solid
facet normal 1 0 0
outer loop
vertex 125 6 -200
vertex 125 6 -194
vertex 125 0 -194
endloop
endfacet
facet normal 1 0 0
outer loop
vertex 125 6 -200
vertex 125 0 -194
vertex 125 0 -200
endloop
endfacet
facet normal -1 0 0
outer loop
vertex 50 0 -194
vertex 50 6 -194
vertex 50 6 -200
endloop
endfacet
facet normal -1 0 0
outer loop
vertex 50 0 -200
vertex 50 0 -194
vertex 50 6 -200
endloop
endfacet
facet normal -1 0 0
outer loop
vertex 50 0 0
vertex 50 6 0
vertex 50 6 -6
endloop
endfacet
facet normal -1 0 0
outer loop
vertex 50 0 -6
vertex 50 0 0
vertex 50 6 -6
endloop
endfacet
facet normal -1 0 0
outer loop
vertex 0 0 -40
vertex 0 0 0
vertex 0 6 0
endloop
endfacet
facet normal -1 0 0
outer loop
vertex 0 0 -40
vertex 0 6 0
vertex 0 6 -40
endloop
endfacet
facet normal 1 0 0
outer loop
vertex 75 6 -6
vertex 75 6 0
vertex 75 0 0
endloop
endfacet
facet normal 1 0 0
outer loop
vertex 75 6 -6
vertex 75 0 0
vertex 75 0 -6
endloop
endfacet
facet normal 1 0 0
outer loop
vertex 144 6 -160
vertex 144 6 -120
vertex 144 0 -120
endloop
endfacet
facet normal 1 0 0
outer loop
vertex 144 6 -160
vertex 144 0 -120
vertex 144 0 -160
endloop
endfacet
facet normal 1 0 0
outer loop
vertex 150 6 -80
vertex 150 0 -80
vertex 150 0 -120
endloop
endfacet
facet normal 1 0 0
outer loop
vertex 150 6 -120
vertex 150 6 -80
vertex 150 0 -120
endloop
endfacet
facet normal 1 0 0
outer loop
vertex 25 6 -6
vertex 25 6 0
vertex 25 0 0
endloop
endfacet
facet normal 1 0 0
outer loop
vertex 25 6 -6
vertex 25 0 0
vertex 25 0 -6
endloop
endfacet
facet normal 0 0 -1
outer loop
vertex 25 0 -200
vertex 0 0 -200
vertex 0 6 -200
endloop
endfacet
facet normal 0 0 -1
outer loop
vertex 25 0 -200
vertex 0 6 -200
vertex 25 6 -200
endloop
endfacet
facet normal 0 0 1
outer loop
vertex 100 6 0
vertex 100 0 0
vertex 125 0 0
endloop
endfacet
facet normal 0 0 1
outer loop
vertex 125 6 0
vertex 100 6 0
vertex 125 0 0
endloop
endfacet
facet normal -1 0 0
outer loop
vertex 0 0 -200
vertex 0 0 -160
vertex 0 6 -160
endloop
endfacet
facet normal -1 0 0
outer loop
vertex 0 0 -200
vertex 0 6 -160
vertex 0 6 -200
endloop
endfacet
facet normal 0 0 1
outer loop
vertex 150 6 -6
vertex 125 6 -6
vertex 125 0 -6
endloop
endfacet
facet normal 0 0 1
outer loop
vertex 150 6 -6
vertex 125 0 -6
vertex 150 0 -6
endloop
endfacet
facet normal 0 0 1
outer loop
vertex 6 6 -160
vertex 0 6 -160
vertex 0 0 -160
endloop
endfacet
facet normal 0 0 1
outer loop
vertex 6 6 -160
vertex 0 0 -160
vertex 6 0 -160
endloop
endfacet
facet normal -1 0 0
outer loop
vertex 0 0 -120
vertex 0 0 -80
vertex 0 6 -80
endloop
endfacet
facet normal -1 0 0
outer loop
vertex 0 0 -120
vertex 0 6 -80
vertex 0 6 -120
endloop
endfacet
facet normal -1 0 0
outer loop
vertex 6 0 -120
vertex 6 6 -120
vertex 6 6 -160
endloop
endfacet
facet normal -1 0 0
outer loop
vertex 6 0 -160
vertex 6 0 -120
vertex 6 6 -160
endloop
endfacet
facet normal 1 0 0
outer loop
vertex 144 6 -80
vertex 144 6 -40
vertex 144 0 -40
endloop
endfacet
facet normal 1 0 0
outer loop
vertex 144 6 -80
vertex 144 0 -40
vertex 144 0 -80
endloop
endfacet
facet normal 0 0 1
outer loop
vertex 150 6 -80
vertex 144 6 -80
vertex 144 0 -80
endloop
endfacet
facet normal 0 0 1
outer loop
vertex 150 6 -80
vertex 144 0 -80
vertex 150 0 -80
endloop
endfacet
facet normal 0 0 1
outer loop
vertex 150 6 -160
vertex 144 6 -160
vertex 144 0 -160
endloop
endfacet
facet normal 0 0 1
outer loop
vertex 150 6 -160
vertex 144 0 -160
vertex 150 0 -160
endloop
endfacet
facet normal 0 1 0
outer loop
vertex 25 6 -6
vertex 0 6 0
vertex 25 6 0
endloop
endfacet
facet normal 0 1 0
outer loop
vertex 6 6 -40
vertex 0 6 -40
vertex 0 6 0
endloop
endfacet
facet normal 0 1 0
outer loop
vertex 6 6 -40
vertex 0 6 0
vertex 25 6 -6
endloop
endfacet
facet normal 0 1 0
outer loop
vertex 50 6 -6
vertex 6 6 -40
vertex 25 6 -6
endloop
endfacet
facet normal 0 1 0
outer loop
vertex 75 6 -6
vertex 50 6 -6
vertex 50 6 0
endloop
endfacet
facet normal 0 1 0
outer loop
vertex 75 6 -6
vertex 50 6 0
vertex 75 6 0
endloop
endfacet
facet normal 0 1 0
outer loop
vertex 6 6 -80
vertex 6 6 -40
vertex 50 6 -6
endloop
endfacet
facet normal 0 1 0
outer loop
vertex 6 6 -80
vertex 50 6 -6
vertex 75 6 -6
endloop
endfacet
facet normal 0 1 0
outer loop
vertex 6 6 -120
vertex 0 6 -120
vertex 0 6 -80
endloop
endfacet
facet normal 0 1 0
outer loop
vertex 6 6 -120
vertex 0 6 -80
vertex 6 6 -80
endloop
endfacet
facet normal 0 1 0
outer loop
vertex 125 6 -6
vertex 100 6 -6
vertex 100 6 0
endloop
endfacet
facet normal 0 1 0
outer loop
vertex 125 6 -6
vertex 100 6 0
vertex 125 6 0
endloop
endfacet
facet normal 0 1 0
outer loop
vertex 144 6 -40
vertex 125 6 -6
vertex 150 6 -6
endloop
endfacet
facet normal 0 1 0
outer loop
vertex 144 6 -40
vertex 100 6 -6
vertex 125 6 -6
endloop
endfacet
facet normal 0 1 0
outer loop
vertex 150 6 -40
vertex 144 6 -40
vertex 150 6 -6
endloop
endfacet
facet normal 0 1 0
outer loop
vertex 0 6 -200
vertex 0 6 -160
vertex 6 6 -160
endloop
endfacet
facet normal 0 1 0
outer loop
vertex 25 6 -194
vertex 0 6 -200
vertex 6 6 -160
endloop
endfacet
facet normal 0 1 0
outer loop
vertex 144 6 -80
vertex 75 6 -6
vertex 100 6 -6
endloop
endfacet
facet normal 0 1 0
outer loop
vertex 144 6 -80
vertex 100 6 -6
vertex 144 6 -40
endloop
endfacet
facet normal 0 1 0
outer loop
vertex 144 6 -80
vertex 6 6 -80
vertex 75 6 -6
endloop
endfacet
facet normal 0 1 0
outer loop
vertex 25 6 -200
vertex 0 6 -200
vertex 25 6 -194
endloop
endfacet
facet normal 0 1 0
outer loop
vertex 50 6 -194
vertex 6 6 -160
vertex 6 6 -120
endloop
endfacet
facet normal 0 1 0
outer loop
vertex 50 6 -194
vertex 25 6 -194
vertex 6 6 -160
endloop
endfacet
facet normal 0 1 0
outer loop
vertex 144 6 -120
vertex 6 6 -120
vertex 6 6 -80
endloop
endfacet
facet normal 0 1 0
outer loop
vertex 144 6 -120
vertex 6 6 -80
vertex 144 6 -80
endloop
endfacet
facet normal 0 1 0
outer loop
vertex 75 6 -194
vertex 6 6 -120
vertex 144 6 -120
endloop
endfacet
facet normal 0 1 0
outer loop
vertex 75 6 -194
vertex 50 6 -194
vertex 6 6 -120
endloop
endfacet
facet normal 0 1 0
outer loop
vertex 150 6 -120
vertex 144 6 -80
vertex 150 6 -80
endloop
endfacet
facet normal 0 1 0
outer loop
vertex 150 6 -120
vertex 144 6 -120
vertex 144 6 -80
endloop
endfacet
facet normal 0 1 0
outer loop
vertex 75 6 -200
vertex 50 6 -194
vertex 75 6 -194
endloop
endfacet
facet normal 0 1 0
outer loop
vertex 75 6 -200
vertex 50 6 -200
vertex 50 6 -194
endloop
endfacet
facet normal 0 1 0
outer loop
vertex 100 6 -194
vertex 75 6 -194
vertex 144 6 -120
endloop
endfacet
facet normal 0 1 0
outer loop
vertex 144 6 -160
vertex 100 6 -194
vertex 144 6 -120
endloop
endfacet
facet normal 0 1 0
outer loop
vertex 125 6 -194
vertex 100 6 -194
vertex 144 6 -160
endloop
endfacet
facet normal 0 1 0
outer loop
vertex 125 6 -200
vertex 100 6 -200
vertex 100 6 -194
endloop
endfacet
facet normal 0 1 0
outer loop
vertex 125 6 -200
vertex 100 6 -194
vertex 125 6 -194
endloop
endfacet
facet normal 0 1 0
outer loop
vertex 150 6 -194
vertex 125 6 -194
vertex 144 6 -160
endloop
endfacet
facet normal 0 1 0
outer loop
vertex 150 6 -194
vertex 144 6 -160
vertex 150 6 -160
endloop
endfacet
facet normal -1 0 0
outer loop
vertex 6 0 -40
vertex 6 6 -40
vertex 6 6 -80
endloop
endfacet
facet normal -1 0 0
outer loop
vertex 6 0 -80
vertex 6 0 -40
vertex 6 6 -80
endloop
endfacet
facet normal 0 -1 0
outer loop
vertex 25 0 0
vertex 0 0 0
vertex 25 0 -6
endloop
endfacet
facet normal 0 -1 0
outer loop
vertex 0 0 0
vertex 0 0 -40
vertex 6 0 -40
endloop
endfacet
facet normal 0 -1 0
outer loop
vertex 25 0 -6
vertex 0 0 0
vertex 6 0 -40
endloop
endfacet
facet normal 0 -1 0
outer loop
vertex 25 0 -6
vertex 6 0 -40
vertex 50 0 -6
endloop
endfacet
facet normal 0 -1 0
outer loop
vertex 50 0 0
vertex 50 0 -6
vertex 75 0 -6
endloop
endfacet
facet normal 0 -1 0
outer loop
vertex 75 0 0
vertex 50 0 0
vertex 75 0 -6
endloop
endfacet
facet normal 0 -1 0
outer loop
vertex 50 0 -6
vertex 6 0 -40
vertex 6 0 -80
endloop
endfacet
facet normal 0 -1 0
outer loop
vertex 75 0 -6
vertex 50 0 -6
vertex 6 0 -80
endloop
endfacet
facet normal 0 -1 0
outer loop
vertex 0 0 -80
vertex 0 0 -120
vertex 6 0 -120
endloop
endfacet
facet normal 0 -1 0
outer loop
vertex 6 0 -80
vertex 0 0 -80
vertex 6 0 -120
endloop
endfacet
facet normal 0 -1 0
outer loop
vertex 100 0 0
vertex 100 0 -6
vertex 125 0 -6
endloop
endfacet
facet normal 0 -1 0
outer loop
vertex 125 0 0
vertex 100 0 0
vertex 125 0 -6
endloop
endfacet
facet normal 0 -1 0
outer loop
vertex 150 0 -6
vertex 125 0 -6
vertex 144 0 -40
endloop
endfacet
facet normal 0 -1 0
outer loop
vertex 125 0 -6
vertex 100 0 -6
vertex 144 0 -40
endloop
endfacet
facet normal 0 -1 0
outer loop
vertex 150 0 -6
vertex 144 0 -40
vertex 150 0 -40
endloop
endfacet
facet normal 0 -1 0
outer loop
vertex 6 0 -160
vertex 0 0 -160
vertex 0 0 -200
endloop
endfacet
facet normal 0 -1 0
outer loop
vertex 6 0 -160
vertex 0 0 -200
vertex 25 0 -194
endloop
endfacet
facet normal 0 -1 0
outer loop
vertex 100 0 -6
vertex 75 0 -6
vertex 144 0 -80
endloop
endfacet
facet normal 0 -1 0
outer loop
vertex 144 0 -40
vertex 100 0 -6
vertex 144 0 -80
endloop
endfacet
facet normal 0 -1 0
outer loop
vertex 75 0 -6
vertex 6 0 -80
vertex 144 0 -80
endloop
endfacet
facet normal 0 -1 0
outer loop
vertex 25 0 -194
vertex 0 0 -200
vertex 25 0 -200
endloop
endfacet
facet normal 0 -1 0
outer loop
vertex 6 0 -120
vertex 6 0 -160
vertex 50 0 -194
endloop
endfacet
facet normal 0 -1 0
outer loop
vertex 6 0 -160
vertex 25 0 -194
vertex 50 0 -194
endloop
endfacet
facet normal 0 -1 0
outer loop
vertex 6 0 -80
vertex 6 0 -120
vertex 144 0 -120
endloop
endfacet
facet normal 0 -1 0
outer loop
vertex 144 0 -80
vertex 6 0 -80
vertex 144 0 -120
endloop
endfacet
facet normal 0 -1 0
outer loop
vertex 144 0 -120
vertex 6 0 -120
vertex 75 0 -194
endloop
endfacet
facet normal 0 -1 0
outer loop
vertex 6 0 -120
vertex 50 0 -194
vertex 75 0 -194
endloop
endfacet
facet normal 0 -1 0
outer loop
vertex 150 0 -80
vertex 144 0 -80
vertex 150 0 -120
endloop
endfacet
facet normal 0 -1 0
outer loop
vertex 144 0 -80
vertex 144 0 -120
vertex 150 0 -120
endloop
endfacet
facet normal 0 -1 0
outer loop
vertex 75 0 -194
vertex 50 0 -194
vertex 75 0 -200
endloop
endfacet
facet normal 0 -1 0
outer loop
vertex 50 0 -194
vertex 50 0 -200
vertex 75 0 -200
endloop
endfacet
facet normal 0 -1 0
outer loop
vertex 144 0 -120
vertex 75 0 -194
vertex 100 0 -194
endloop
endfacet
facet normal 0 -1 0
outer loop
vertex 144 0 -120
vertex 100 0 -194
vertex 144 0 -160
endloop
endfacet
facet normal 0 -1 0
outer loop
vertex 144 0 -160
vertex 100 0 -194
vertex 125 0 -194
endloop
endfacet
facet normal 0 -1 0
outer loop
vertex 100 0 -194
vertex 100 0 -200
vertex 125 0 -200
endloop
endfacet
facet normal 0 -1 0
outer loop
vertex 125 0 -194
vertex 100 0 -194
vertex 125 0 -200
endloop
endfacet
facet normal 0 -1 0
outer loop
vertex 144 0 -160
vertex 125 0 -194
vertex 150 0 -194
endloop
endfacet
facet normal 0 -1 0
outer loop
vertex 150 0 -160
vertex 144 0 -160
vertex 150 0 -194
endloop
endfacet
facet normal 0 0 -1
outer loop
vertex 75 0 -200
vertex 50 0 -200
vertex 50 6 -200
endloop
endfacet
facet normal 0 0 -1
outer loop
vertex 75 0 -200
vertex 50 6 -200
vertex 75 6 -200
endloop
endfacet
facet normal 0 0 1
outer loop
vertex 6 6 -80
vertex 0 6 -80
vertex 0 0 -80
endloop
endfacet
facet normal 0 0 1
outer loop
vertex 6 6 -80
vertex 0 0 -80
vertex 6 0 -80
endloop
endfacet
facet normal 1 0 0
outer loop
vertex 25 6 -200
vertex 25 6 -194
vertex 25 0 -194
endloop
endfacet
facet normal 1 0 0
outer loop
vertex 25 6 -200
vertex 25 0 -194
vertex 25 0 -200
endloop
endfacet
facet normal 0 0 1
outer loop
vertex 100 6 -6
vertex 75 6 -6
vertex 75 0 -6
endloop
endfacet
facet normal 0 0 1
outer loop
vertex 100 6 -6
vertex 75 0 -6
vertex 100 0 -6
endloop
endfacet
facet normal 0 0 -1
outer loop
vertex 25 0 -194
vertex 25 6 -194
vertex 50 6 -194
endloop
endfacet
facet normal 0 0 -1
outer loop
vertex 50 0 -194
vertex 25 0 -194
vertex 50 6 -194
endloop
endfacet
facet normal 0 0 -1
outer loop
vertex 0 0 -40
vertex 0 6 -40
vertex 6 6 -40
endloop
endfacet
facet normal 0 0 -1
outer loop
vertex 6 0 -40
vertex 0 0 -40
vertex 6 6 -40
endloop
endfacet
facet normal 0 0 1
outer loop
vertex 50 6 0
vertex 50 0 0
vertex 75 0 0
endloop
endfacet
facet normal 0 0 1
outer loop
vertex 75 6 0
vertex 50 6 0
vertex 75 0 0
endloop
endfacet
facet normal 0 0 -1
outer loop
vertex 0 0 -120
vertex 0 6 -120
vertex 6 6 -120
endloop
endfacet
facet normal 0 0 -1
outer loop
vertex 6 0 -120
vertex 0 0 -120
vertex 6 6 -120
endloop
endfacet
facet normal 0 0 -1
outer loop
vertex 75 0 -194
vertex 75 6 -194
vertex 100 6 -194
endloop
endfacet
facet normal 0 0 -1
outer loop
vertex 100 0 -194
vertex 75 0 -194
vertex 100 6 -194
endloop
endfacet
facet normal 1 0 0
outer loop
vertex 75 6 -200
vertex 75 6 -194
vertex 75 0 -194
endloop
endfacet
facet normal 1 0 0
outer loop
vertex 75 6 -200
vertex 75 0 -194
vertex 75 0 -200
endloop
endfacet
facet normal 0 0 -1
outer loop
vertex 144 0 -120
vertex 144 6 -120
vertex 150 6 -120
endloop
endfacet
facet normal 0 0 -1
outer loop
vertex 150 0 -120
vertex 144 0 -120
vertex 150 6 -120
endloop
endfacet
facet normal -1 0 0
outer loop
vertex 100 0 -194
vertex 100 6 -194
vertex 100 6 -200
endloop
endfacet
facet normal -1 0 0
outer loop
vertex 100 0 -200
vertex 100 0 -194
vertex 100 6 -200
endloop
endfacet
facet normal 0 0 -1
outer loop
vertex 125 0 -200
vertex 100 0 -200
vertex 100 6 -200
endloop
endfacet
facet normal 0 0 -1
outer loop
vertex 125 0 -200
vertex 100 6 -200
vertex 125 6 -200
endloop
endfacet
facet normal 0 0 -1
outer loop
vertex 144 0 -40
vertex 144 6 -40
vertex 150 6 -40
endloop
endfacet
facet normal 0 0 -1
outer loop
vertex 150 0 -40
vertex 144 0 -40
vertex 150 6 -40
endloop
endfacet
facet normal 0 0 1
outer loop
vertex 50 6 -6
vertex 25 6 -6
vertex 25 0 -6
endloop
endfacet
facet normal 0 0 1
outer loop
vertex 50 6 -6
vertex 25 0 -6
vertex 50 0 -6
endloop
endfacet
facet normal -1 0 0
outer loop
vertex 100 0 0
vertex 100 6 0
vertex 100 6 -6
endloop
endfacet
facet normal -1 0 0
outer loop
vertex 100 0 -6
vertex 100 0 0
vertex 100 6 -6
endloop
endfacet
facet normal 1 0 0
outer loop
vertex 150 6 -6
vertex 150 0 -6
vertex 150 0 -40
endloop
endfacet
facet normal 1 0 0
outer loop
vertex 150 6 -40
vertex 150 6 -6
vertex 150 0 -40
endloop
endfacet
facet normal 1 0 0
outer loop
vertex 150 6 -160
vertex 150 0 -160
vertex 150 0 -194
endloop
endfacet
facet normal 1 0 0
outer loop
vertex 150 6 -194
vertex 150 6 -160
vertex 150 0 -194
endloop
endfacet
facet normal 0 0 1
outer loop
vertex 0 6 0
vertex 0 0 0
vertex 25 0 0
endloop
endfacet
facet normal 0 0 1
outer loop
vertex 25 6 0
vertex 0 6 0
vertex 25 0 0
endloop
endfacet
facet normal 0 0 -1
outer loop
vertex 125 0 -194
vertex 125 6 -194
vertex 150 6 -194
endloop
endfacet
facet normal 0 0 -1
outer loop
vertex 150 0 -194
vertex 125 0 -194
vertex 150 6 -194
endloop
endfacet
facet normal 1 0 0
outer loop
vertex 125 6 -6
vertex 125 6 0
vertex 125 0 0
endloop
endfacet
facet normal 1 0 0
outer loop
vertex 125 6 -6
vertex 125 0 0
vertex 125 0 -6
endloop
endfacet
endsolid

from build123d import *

# Parameters (mm, degrees)
SKETCH1_W           = 150
SKETCH1_H           = 200
BOSS_EXTRUDE1_DEPTH = 6
SKETCH2_W           = 25
SKETCH2_H           = 6
SKETCH2_W_2         = 6
SKETCH2_H_2         = 40
CUT_EXTRUDE1_DEPTH  = 6


with BuildPart() as part:
    # Sketch1 → Boss-Extrude1 (new body)
    with BuildSketch(Plane(origin=(0, 0, 0), x_dir=(1, 0, 0), z_dir=(0, 1, 0))):
        with Locations((75, 100)):
            Rectangle(SKETCH1_W, SKETCH1_H)
    extrude(amount=BOSS_EXTRUDE1_DEPTH)

    # Sketch2 → Cut-Extrude1 (cut)
    with BuildSketch(Plane(origin=(0, 6, 0), x_dir=(1, 0, 0), z_dir=(0, 1, 0))):
        with Locations((37.5, 3)):
            Rectangle(SKETCH2_W, SKETCH2_H)
        with Locations((87.5, 3)):
            Rectangle(SKETCH2_W, SKETCH2_H)
        with Locations((137.5, 3)):
            Rectangle(SKETCH2_W, SKETCH2_H)
        with Locations((37.5, 197)):
            Rectangle(SKETCH2_W, SKETCH2_H)
        with Locations((87.5, 197)):
            Rectangle(SKETCH2_W, SKETCH2_H)
        with Locations((137.5, 197)):
            Rectangle(SKETCH2_W, SKETCH2_H)
        with Locations((3, 140)):
            Rectangle(SKETCH2_W_2, SKETCH2_H_2)
        with Locations((147, 140)):
            Rectangle(SKETCH2_W_2, SKETCH2_H_2)
        with Locations((147, 60)):
            Rectangle(SKETCH2_W_2, SKETCH2_H_2)
        with Locations((3, 60)):
            Rectangle(SKETCH2_W_2, SKETCH2_H_2)
    extrude(amount=-CUT_EXTRUDE1_DEPTH, mode=Mode.SUBTRACT)


solid = part.part
